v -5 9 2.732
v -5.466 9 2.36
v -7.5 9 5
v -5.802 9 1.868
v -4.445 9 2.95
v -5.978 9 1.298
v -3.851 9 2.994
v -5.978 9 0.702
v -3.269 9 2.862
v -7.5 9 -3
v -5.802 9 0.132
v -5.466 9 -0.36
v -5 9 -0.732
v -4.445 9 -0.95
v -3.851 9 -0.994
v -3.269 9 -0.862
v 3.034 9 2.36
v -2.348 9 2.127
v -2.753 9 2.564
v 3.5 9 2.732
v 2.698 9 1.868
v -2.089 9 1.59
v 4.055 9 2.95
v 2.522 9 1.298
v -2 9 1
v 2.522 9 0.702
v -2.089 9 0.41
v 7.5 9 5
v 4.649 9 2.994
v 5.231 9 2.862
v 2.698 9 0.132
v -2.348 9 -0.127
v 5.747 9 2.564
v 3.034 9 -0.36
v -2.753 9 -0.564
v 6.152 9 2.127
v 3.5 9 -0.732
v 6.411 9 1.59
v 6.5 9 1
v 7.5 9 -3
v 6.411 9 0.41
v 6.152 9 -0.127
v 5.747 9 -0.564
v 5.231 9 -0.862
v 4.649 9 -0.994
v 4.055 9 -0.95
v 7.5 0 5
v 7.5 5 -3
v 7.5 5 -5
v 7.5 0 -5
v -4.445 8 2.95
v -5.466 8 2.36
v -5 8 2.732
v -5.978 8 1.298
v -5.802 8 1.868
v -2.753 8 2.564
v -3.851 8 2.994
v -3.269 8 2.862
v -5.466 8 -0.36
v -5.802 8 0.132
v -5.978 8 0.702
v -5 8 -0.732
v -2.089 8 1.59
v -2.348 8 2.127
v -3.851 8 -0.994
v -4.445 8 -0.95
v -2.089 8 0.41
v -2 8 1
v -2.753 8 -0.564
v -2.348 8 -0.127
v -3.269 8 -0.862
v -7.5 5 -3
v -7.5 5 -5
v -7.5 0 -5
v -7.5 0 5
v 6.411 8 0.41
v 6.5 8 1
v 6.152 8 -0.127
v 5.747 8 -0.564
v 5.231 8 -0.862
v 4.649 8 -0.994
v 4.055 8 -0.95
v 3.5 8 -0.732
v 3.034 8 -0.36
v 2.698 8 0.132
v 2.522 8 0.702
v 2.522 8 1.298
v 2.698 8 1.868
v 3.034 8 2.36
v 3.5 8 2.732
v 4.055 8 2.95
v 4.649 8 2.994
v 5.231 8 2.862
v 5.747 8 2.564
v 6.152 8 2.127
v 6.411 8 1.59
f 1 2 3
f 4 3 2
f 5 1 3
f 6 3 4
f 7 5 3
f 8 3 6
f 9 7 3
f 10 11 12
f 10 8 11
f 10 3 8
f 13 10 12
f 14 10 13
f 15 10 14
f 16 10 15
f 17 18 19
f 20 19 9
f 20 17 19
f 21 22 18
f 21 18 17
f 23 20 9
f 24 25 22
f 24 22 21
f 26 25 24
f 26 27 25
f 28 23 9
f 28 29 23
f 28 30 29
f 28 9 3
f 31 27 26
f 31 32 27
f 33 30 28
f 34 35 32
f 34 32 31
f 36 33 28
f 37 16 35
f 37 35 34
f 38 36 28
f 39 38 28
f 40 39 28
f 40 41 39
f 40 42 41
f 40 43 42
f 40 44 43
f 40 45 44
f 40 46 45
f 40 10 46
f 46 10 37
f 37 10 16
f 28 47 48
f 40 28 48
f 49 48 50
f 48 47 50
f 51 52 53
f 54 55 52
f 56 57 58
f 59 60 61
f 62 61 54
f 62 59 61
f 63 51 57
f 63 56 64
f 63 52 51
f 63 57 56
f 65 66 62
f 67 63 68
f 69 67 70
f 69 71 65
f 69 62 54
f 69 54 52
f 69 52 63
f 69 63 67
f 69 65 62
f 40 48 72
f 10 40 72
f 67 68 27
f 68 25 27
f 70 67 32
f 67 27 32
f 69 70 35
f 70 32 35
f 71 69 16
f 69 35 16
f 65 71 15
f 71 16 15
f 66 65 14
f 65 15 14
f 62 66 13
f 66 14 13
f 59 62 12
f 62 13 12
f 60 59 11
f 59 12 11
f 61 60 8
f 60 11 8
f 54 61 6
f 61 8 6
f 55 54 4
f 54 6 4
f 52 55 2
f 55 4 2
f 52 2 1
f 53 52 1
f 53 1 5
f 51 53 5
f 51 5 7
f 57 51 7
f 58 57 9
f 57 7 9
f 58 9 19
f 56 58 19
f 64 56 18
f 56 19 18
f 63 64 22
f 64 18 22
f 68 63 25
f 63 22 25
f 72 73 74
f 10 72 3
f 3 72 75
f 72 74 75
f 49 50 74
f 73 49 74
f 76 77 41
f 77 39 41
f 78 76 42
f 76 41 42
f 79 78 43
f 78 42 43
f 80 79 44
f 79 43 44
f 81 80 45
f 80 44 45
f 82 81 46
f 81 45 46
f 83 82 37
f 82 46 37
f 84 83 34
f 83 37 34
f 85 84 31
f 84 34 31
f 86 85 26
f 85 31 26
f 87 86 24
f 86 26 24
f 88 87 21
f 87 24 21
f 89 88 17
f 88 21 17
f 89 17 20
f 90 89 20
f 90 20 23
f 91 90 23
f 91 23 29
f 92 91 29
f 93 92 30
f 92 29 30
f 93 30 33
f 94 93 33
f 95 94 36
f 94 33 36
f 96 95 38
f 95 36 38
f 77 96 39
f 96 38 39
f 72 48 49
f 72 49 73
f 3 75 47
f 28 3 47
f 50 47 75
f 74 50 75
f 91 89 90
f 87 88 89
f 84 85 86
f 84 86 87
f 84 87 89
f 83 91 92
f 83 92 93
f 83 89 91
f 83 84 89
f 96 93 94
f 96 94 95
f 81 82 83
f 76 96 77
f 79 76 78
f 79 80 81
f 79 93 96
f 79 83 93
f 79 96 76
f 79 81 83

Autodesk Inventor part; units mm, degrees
ref_plane "YZ Plane" through (0, 0, 0) normal (1, 0, 0) x (0, 1, 0)
ref_plane "XZ Plane" through (0, 0, 0) normal (0, 1, 0) x (-1, 0, 0)
ref_plane "XY Plane" through (0, 0, 0) normal (0, 0, 1) x (1, 0, 0)
sketch "Szkic1" plane through (0, 0, 0) normal (0, 1, 0) x (-1, 0, 0)
  line L0 (7.5, 5) -> (-7.5, 5)
  line L1 (-7.5, 5) -> (-7.5, -5)
  line L2 (-7.5, -5) -> (7.5, -5)
  line L3 (7.5, -5) -> (7.5, 5)
  point P0 (0, 0)
  dimension "d0" = 10
  dimension "d1" = 15
  dimension "d2" = 5
  dimension "d3" = 7.5
extrude "Wyciągnięcie proste1" add sketch "Szkic1" along normal blind 5
sketch "Szkic2" plane through (0, 5, 0) normal (0, 1, 0) x (1, 0, 0)
  line L0 (-7.5, -5) -> (7.5, -5) projected
  line L1 (7.5, -5) -> (7.5, 5) projected
  line L2 (-7.5, -5) -> (7.5, -5)
  line L3 (7.5, -5) -> (7.5, 3)
  line L4 (7.5, 3) -> (-7.5, 3)
  line L5 (-7.5, 3) -> (-7.5, -5)
  point P0 (0, 0)
  dimension "d6" = 8
extrude "Wyciągnięcie proste2" add sketch "Szkic2" along normal blind 4
sketch "Szkic3" plane through (0, 9, 0) normal (0, 1, 0) x (1, 0, 0)
  circle A0 centre (-4, -1) radius 2
  line L0 (-7.5, 3) -> (-7.5, -5) projected
  line L1 (7.5, 3) -> (-7.5, 3) projected
  circle A1 centre (4.5, -1) radius 2
  line L2 (7.5, -5) -> (7.5, 3) projected
  point P0 (0, 0)
  dimension "d9" = 4
  dimension "d10" = 3.5
  dimension "d11" = 4
  dimension "d12" = 3
  dimension "d13" = 4
  dimension "d14" = 4
extrude "Wyciągnięcie proste3" cut sketch "Szkic3" against normal blind 1
properties part number "Sharp"
